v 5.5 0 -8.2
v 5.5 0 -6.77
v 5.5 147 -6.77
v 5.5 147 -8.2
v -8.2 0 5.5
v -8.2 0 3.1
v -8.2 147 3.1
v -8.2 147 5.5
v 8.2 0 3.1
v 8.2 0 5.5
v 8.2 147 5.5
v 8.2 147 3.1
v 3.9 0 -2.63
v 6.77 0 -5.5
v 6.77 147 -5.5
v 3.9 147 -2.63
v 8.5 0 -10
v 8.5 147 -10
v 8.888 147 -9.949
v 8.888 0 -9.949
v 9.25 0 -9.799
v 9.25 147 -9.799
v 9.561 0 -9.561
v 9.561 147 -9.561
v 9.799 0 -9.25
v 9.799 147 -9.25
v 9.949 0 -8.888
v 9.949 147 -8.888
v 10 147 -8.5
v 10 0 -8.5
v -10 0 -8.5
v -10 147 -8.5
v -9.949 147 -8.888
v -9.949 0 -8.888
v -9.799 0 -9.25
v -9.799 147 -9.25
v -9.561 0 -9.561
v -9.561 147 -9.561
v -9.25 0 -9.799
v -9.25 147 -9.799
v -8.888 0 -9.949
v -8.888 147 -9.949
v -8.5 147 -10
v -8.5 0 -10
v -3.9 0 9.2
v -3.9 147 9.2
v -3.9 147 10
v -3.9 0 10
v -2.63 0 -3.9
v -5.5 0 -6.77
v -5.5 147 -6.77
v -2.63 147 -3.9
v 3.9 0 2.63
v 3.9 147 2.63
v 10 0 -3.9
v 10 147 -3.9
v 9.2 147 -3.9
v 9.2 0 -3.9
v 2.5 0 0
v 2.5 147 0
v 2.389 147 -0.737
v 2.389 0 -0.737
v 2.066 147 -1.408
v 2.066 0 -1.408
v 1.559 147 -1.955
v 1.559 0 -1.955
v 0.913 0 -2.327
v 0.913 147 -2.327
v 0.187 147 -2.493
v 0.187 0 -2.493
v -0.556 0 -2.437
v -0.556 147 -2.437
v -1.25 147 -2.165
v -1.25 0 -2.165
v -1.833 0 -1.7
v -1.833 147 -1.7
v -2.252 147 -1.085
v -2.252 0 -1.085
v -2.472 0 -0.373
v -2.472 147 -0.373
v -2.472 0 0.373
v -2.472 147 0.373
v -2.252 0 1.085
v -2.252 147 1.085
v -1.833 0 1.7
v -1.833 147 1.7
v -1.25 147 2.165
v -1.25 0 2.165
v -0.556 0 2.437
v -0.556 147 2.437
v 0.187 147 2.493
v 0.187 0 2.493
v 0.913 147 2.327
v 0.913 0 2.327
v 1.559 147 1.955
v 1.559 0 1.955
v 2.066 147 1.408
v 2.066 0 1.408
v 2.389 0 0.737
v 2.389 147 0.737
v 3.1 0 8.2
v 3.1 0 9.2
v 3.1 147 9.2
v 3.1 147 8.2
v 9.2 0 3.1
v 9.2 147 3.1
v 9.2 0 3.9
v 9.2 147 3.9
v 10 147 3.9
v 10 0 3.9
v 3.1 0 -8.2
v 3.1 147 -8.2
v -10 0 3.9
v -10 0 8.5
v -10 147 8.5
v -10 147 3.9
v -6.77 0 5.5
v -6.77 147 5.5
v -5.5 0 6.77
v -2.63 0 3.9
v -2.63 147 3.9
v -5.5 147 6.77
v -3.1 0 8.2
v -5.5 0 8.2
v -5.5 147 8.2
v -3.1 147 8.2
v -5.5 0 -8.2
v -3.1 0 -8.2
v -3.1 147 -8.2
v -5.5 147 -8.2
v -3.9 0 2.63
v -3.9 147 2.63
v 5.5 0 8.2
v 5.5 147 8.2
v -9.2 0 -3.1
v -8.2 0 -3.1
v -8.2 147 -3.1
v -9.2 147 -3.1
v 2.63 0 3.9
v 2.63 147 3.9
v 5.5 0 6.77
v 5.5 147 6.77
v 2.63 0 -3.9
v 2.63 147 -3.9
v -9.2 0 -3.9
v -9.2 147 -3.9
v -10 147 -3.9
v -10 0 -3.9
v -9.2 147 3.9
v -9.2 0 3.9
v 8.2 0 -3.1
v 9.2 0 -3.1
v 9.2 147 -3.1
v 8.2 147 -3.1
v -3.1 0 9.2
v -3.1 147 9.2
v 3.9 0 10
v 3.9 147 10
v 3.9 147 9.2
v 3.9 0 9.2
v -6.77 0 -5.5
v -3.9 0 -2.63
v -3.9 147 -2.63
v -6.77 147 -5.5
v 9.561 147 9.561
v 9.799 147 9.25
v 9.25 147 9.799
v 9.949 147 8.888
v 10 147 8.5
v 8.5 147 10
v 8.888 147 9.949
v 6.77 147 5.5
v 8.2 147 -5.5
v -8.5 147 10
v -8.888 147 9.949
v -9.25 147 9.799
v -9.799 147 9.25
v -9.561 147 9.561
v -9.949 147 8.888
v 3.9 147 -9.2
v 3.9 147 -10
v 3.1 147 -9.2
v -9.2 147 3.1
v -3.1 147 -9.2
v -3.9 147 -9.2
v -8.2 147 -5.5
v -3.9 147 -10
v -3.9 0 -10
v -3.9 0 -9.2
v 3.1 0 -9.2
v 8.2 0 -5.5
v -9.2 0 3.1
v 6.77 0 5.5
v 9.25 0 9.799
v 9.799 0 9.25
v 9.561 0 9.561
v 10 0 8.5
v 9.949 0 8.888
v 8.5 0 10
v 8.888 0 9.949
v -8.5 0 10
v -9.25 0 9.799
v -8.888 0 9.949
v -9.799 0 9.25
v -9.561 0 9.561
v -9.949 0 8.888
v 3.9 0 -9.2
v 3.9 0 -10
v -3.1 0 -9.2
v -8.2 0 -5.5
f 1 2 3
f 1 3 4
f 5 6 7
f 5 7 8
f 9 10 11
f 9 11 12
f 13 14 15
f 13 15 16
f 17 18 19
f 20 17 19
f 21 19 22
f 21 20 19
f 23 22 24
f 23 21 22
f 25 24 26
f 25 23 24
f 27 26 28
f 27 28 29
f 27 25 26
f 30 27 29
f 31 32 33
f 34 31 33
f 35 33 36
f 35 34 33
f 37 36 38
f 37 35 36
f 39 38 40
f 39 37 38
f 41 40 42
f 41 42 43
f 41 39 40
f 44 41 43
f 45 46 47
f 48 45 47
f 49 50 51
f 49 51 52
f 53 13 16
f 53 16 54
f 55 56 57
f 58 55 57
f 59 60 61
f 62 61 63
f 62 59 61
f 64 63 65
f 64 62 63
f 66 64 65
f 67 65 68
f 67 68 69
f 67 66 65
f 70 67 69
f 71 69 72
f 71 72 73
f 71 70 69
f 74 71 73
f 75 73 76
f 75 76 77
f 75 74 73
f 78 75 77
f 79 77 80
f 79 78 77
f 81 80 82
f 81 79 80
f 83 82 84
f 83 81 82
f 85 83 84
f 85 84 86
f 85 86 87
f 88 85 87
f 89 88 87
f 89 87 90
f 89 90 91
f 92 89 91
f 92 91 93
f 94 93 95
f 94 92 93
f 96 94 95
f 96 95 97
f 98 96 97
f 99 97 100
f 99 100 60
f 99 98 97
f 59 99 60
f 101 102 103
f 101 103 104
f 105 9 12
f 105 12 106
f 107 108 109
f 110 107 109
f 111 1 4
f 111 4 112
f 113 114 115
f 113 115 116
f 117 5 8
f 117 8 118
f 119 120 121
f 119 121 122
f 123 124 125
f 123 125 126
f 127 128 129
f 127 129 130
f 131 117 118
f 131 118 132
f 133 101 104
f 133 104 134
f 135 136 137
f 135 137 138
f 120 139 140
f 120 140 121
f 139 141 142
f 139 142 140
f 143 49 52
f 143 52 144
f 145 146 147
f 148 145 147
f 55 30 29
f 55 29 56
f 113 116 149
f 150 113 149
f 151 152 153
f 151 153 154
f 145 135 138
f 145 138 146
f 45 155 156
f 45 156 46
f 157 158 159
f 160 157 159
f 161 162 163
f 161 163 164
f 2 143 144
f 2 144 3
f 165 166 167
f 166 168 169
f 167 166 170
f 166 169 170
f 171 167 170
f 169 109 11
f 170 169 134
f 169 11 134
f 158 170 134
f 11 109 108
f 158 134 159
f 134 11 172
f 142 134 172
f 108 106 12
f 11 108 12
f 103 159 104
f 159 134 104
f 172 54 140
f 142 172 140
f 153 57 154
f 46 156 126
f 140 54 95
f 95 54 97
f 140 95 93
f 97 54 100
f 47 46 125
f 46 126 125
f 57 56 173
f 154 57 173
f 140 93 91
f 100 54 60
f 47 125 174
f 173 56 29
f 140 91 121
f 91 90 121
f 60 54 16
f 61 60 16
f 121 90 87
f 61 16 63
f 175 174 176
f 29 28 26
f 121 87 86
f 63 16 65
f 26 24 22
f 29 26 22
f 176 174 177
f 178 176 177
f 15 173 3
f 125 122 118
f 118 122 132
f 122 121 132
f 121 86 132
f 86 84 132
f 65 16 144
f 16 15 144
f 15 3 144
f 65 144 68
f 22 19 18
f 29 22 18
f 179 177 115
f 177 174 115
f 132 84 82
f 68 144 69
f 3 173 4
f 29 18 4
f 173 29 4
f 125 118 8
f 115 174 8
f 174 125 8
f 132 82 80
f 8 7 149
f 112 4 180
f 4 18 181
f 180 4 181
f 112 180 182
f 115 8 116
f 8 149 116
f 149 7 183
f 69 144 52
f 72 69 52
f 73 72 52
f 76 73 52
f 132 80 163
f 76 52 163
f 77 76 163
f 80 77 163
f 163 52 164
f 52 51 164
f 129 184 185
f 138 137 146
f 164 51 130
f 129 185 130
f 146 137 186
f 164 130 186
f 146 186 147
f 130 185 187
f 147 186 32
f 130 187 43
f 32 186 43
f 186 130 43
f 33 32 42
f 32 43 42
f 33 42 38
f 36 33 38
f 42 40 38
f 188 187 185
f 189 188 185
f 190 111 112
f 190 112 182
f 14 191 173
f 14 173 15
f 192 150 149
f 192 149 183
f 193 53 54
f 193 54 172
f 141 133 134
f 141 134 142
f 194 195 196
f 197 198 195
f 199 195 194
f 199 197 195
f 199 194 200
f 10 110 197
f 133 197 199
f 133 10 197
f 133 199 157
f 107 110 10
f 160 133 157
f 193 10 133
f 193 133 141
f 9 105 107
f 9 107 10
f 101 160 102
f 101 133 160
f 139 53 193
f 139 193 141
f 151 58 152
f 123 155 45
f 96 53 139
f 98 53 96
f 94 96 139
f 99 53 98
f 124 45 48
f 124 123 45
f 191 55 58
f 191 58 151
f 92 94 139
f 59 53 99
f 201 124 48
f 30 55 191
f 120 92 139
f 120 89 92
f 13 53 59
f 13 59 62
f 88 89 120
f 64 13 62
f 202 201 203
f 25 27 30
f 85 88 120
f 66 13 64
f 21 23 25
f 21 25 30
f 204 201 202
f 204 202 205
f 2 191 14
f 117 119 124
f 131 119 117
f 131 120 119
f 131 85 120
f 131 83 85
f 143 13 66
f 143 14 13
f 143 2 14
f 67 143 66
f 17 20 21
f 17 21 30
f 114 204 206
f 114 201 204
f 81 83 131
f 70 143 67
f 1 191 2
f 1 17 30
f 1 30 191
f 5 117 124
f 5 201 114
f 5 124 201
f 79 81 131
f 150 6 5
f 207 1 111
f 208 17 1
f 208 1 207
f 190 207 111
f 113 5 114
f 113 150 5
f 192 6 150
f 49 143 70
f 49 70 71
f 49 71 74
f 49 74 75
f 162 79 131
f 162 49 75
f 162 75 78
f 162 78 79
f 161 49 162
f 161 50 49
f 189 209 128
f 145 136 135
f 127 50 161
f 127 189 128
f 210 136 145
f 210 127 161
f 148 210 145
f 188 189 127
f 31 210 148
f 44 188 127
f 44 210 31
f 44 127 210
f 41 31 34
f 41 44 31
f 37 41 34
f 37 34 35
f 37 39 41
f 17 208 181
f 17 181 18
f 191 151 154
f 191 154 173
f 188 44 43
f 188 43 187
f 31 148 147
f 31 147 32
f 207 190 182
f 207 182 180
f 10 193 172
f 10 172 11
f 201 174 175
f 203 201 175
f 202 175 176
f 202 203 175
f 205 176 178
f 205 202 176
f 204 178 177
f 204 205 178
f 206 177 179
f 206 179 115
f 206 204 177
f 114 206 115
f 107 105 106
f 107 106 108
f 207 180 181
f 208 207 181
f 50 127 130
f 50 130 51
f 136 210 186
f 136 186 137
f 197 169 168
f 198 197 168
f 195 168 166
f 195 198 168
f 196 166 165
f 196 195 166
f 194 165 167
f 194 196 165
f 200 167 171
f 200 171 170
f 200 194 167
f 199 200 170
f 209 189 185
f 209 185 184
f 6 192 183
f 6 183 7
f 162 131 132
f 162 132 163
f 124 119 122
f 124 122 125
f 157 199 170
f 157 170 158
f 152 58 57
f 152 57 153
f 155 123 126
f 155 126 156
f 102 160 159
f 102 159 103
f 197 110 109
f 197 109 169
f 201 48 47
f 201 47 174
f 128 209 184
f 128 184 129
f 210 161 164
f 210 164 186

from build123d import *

# Parameters (mm, degrees)
SKETCH1_R           = 2.5
BOSS_EXTRUDE1_DEPTH = 147


with BuildPart() as part:
    # Sketch1 → Boss-Extrude1 (new body)
    with BuildSketch(Plane(origin=(0, 0, 0), x_dir=(1, 0, 0), z_dir=(0, 1, 0))):
        with BuildLine():
            Line((3.9, 10), (8.5, 10))
            ThreePointArc((8.5, 10), (9.560660172, 9.560660172), (10, 8.5))
            Line((10, 8.5), (10, 3.9))
            Line((10, 3.9), (9.2, 3.9))
            Line((9.2, 3.9), (9.2, 3.1))
            Line((9.2, 3.1), (8.2, 3.1))
            Line((8.2, 3.1), (8.2, 5.5))
            Line((8.2, 5.5), (6.77, 5.5))
            Line((6.77, 5.5), (3.9, 2.63))
            Line((3.9, 2.63), (3.9, 0))
            Line((3.9, 0), (3.9, -2.63))
            Line((3.9, -2.63), (6.77, -5.5))
            Line((6.77, -5.5), (8.2, -5.5))
            Line((8.2, -5.5), (8.2, -3.1))
            Line((8.2, -3.1), (9.2, -3.1))
            Line((9.2, -3.1), (9.2, -3.9))
            Line((9.2, -3.9), (10, -3.9))
            Line((10, -3.9), (10, -8.5))
            ThreePointArc((10, -8.5), (9.560660172, -9.560660172), (8.5, -10))
            Line((8.5, -10), (3.9, -10))
            Line((3.9, -10), (3.9, -9.2))
            Line((3.9, -9.2), (3.1, -9.2))
            Line((3.1, -9.2), (3.1, -8.2))
            Line((3.1, -8.2), (5.5, -8.2))
            Line((5.5, -8.2), (5.5, -6.77))
            Line((5.5, -6.77), (2.63, -3.9))
            Line((2.63, -3.9), (0, -3.9))
            Line((0, -3.9), (-2.63, -3.9))
            Line((-2.63, -3.9), (-5.5, -6.77))
            Line((-5.5, -6.77), (-5.5, -8.2))
            Line((-5.5, -8.2), (-3.1, -8.2))
            Line((-3.1, -8.2), (-3.1, -9.2))
            Line((-3.1, -9.2), (-3.9, -9.2))
            Line((-3.9, -9.2), (-3.9, -10))
            Line((-3.9, -10), (-8.5, -10))
            ThreePointArc((-8.5, -10), (-9.560660172, -9.560660172), (-10, -8.5))
            Line((-10, -8.5), (-10, -3.9))
            Line((-10, -3.9), (-9.2, -3.9))
            Line((-9.2, -3.9), (-9.2, -3.1))
            Line((-9.2, -3.1), (-8.2, -3.1))
            Line((-8.2, -3.1), (-8.2, -5.5))
            Line((-8.2, -5.5), (-6.77, -5.5))
            Line((-6.77, -5.5), (-3.9, -2.63))
            Line((-3.9, -2.63), (-3.9, 0))
            Line((-3.9, 0), (-3.9, 2.63))
            Line((-3.9, 2.63), (-6.77, 5.5))
            Line((-6.77, 5.5), (-8.2, 5.5))
            Line((-8.2, 5.5), (-8.2, 3.1))
            Line((-8.2, 3.1), (-9.2, 3.1))
            Line((-9.2, 3.1), (-9.2, 3.9))
            Line((-9.2, 3.9), (-10, 3.9))
            Line((-10, 3.9), (-10, 8.5))
            ThreePointArc((-10, 8.5), (-9.560660172, 9.560660172), (-8.5, 10))
            Line((-8.5, 10), (-3.9, 10))
            Line((-3.9, 10), (-3.9, 9.2))
            Line((-3.9, 9.2), (-3.1, 9.2))
            Line((-3.1, 9.2), (-3.1, 8.2))
            Line((-3.1, 8.2), (-5.5, 8.2))
            Line((-5.5, 8.2), (-5.5, 6.77))
            Line((-5.5, 6.77), (-2.63, 3.9))
            Line((-2.63, 3.9), (2.63, 3.9))
            Line((2.63, 3.9), (5.5, 6.77))
            Line((5.5, 6.77), (5.5, 8.2))
            Line((5.5, 8.2), (3.1, 8.2))
            Line((3.1, 8.2), (3.1, 9.2))
            Line((3.1, 9.2), (3.9, 9.2))
            Line((3.9, 9.2), (3.9, 10))
        make_face()
        Circle(SKETCH1_R, mode=Mode.SUBTRACT)
    extrude(amount=BOSS_EXTRUDE1_DEPTH)


solid = part.part
